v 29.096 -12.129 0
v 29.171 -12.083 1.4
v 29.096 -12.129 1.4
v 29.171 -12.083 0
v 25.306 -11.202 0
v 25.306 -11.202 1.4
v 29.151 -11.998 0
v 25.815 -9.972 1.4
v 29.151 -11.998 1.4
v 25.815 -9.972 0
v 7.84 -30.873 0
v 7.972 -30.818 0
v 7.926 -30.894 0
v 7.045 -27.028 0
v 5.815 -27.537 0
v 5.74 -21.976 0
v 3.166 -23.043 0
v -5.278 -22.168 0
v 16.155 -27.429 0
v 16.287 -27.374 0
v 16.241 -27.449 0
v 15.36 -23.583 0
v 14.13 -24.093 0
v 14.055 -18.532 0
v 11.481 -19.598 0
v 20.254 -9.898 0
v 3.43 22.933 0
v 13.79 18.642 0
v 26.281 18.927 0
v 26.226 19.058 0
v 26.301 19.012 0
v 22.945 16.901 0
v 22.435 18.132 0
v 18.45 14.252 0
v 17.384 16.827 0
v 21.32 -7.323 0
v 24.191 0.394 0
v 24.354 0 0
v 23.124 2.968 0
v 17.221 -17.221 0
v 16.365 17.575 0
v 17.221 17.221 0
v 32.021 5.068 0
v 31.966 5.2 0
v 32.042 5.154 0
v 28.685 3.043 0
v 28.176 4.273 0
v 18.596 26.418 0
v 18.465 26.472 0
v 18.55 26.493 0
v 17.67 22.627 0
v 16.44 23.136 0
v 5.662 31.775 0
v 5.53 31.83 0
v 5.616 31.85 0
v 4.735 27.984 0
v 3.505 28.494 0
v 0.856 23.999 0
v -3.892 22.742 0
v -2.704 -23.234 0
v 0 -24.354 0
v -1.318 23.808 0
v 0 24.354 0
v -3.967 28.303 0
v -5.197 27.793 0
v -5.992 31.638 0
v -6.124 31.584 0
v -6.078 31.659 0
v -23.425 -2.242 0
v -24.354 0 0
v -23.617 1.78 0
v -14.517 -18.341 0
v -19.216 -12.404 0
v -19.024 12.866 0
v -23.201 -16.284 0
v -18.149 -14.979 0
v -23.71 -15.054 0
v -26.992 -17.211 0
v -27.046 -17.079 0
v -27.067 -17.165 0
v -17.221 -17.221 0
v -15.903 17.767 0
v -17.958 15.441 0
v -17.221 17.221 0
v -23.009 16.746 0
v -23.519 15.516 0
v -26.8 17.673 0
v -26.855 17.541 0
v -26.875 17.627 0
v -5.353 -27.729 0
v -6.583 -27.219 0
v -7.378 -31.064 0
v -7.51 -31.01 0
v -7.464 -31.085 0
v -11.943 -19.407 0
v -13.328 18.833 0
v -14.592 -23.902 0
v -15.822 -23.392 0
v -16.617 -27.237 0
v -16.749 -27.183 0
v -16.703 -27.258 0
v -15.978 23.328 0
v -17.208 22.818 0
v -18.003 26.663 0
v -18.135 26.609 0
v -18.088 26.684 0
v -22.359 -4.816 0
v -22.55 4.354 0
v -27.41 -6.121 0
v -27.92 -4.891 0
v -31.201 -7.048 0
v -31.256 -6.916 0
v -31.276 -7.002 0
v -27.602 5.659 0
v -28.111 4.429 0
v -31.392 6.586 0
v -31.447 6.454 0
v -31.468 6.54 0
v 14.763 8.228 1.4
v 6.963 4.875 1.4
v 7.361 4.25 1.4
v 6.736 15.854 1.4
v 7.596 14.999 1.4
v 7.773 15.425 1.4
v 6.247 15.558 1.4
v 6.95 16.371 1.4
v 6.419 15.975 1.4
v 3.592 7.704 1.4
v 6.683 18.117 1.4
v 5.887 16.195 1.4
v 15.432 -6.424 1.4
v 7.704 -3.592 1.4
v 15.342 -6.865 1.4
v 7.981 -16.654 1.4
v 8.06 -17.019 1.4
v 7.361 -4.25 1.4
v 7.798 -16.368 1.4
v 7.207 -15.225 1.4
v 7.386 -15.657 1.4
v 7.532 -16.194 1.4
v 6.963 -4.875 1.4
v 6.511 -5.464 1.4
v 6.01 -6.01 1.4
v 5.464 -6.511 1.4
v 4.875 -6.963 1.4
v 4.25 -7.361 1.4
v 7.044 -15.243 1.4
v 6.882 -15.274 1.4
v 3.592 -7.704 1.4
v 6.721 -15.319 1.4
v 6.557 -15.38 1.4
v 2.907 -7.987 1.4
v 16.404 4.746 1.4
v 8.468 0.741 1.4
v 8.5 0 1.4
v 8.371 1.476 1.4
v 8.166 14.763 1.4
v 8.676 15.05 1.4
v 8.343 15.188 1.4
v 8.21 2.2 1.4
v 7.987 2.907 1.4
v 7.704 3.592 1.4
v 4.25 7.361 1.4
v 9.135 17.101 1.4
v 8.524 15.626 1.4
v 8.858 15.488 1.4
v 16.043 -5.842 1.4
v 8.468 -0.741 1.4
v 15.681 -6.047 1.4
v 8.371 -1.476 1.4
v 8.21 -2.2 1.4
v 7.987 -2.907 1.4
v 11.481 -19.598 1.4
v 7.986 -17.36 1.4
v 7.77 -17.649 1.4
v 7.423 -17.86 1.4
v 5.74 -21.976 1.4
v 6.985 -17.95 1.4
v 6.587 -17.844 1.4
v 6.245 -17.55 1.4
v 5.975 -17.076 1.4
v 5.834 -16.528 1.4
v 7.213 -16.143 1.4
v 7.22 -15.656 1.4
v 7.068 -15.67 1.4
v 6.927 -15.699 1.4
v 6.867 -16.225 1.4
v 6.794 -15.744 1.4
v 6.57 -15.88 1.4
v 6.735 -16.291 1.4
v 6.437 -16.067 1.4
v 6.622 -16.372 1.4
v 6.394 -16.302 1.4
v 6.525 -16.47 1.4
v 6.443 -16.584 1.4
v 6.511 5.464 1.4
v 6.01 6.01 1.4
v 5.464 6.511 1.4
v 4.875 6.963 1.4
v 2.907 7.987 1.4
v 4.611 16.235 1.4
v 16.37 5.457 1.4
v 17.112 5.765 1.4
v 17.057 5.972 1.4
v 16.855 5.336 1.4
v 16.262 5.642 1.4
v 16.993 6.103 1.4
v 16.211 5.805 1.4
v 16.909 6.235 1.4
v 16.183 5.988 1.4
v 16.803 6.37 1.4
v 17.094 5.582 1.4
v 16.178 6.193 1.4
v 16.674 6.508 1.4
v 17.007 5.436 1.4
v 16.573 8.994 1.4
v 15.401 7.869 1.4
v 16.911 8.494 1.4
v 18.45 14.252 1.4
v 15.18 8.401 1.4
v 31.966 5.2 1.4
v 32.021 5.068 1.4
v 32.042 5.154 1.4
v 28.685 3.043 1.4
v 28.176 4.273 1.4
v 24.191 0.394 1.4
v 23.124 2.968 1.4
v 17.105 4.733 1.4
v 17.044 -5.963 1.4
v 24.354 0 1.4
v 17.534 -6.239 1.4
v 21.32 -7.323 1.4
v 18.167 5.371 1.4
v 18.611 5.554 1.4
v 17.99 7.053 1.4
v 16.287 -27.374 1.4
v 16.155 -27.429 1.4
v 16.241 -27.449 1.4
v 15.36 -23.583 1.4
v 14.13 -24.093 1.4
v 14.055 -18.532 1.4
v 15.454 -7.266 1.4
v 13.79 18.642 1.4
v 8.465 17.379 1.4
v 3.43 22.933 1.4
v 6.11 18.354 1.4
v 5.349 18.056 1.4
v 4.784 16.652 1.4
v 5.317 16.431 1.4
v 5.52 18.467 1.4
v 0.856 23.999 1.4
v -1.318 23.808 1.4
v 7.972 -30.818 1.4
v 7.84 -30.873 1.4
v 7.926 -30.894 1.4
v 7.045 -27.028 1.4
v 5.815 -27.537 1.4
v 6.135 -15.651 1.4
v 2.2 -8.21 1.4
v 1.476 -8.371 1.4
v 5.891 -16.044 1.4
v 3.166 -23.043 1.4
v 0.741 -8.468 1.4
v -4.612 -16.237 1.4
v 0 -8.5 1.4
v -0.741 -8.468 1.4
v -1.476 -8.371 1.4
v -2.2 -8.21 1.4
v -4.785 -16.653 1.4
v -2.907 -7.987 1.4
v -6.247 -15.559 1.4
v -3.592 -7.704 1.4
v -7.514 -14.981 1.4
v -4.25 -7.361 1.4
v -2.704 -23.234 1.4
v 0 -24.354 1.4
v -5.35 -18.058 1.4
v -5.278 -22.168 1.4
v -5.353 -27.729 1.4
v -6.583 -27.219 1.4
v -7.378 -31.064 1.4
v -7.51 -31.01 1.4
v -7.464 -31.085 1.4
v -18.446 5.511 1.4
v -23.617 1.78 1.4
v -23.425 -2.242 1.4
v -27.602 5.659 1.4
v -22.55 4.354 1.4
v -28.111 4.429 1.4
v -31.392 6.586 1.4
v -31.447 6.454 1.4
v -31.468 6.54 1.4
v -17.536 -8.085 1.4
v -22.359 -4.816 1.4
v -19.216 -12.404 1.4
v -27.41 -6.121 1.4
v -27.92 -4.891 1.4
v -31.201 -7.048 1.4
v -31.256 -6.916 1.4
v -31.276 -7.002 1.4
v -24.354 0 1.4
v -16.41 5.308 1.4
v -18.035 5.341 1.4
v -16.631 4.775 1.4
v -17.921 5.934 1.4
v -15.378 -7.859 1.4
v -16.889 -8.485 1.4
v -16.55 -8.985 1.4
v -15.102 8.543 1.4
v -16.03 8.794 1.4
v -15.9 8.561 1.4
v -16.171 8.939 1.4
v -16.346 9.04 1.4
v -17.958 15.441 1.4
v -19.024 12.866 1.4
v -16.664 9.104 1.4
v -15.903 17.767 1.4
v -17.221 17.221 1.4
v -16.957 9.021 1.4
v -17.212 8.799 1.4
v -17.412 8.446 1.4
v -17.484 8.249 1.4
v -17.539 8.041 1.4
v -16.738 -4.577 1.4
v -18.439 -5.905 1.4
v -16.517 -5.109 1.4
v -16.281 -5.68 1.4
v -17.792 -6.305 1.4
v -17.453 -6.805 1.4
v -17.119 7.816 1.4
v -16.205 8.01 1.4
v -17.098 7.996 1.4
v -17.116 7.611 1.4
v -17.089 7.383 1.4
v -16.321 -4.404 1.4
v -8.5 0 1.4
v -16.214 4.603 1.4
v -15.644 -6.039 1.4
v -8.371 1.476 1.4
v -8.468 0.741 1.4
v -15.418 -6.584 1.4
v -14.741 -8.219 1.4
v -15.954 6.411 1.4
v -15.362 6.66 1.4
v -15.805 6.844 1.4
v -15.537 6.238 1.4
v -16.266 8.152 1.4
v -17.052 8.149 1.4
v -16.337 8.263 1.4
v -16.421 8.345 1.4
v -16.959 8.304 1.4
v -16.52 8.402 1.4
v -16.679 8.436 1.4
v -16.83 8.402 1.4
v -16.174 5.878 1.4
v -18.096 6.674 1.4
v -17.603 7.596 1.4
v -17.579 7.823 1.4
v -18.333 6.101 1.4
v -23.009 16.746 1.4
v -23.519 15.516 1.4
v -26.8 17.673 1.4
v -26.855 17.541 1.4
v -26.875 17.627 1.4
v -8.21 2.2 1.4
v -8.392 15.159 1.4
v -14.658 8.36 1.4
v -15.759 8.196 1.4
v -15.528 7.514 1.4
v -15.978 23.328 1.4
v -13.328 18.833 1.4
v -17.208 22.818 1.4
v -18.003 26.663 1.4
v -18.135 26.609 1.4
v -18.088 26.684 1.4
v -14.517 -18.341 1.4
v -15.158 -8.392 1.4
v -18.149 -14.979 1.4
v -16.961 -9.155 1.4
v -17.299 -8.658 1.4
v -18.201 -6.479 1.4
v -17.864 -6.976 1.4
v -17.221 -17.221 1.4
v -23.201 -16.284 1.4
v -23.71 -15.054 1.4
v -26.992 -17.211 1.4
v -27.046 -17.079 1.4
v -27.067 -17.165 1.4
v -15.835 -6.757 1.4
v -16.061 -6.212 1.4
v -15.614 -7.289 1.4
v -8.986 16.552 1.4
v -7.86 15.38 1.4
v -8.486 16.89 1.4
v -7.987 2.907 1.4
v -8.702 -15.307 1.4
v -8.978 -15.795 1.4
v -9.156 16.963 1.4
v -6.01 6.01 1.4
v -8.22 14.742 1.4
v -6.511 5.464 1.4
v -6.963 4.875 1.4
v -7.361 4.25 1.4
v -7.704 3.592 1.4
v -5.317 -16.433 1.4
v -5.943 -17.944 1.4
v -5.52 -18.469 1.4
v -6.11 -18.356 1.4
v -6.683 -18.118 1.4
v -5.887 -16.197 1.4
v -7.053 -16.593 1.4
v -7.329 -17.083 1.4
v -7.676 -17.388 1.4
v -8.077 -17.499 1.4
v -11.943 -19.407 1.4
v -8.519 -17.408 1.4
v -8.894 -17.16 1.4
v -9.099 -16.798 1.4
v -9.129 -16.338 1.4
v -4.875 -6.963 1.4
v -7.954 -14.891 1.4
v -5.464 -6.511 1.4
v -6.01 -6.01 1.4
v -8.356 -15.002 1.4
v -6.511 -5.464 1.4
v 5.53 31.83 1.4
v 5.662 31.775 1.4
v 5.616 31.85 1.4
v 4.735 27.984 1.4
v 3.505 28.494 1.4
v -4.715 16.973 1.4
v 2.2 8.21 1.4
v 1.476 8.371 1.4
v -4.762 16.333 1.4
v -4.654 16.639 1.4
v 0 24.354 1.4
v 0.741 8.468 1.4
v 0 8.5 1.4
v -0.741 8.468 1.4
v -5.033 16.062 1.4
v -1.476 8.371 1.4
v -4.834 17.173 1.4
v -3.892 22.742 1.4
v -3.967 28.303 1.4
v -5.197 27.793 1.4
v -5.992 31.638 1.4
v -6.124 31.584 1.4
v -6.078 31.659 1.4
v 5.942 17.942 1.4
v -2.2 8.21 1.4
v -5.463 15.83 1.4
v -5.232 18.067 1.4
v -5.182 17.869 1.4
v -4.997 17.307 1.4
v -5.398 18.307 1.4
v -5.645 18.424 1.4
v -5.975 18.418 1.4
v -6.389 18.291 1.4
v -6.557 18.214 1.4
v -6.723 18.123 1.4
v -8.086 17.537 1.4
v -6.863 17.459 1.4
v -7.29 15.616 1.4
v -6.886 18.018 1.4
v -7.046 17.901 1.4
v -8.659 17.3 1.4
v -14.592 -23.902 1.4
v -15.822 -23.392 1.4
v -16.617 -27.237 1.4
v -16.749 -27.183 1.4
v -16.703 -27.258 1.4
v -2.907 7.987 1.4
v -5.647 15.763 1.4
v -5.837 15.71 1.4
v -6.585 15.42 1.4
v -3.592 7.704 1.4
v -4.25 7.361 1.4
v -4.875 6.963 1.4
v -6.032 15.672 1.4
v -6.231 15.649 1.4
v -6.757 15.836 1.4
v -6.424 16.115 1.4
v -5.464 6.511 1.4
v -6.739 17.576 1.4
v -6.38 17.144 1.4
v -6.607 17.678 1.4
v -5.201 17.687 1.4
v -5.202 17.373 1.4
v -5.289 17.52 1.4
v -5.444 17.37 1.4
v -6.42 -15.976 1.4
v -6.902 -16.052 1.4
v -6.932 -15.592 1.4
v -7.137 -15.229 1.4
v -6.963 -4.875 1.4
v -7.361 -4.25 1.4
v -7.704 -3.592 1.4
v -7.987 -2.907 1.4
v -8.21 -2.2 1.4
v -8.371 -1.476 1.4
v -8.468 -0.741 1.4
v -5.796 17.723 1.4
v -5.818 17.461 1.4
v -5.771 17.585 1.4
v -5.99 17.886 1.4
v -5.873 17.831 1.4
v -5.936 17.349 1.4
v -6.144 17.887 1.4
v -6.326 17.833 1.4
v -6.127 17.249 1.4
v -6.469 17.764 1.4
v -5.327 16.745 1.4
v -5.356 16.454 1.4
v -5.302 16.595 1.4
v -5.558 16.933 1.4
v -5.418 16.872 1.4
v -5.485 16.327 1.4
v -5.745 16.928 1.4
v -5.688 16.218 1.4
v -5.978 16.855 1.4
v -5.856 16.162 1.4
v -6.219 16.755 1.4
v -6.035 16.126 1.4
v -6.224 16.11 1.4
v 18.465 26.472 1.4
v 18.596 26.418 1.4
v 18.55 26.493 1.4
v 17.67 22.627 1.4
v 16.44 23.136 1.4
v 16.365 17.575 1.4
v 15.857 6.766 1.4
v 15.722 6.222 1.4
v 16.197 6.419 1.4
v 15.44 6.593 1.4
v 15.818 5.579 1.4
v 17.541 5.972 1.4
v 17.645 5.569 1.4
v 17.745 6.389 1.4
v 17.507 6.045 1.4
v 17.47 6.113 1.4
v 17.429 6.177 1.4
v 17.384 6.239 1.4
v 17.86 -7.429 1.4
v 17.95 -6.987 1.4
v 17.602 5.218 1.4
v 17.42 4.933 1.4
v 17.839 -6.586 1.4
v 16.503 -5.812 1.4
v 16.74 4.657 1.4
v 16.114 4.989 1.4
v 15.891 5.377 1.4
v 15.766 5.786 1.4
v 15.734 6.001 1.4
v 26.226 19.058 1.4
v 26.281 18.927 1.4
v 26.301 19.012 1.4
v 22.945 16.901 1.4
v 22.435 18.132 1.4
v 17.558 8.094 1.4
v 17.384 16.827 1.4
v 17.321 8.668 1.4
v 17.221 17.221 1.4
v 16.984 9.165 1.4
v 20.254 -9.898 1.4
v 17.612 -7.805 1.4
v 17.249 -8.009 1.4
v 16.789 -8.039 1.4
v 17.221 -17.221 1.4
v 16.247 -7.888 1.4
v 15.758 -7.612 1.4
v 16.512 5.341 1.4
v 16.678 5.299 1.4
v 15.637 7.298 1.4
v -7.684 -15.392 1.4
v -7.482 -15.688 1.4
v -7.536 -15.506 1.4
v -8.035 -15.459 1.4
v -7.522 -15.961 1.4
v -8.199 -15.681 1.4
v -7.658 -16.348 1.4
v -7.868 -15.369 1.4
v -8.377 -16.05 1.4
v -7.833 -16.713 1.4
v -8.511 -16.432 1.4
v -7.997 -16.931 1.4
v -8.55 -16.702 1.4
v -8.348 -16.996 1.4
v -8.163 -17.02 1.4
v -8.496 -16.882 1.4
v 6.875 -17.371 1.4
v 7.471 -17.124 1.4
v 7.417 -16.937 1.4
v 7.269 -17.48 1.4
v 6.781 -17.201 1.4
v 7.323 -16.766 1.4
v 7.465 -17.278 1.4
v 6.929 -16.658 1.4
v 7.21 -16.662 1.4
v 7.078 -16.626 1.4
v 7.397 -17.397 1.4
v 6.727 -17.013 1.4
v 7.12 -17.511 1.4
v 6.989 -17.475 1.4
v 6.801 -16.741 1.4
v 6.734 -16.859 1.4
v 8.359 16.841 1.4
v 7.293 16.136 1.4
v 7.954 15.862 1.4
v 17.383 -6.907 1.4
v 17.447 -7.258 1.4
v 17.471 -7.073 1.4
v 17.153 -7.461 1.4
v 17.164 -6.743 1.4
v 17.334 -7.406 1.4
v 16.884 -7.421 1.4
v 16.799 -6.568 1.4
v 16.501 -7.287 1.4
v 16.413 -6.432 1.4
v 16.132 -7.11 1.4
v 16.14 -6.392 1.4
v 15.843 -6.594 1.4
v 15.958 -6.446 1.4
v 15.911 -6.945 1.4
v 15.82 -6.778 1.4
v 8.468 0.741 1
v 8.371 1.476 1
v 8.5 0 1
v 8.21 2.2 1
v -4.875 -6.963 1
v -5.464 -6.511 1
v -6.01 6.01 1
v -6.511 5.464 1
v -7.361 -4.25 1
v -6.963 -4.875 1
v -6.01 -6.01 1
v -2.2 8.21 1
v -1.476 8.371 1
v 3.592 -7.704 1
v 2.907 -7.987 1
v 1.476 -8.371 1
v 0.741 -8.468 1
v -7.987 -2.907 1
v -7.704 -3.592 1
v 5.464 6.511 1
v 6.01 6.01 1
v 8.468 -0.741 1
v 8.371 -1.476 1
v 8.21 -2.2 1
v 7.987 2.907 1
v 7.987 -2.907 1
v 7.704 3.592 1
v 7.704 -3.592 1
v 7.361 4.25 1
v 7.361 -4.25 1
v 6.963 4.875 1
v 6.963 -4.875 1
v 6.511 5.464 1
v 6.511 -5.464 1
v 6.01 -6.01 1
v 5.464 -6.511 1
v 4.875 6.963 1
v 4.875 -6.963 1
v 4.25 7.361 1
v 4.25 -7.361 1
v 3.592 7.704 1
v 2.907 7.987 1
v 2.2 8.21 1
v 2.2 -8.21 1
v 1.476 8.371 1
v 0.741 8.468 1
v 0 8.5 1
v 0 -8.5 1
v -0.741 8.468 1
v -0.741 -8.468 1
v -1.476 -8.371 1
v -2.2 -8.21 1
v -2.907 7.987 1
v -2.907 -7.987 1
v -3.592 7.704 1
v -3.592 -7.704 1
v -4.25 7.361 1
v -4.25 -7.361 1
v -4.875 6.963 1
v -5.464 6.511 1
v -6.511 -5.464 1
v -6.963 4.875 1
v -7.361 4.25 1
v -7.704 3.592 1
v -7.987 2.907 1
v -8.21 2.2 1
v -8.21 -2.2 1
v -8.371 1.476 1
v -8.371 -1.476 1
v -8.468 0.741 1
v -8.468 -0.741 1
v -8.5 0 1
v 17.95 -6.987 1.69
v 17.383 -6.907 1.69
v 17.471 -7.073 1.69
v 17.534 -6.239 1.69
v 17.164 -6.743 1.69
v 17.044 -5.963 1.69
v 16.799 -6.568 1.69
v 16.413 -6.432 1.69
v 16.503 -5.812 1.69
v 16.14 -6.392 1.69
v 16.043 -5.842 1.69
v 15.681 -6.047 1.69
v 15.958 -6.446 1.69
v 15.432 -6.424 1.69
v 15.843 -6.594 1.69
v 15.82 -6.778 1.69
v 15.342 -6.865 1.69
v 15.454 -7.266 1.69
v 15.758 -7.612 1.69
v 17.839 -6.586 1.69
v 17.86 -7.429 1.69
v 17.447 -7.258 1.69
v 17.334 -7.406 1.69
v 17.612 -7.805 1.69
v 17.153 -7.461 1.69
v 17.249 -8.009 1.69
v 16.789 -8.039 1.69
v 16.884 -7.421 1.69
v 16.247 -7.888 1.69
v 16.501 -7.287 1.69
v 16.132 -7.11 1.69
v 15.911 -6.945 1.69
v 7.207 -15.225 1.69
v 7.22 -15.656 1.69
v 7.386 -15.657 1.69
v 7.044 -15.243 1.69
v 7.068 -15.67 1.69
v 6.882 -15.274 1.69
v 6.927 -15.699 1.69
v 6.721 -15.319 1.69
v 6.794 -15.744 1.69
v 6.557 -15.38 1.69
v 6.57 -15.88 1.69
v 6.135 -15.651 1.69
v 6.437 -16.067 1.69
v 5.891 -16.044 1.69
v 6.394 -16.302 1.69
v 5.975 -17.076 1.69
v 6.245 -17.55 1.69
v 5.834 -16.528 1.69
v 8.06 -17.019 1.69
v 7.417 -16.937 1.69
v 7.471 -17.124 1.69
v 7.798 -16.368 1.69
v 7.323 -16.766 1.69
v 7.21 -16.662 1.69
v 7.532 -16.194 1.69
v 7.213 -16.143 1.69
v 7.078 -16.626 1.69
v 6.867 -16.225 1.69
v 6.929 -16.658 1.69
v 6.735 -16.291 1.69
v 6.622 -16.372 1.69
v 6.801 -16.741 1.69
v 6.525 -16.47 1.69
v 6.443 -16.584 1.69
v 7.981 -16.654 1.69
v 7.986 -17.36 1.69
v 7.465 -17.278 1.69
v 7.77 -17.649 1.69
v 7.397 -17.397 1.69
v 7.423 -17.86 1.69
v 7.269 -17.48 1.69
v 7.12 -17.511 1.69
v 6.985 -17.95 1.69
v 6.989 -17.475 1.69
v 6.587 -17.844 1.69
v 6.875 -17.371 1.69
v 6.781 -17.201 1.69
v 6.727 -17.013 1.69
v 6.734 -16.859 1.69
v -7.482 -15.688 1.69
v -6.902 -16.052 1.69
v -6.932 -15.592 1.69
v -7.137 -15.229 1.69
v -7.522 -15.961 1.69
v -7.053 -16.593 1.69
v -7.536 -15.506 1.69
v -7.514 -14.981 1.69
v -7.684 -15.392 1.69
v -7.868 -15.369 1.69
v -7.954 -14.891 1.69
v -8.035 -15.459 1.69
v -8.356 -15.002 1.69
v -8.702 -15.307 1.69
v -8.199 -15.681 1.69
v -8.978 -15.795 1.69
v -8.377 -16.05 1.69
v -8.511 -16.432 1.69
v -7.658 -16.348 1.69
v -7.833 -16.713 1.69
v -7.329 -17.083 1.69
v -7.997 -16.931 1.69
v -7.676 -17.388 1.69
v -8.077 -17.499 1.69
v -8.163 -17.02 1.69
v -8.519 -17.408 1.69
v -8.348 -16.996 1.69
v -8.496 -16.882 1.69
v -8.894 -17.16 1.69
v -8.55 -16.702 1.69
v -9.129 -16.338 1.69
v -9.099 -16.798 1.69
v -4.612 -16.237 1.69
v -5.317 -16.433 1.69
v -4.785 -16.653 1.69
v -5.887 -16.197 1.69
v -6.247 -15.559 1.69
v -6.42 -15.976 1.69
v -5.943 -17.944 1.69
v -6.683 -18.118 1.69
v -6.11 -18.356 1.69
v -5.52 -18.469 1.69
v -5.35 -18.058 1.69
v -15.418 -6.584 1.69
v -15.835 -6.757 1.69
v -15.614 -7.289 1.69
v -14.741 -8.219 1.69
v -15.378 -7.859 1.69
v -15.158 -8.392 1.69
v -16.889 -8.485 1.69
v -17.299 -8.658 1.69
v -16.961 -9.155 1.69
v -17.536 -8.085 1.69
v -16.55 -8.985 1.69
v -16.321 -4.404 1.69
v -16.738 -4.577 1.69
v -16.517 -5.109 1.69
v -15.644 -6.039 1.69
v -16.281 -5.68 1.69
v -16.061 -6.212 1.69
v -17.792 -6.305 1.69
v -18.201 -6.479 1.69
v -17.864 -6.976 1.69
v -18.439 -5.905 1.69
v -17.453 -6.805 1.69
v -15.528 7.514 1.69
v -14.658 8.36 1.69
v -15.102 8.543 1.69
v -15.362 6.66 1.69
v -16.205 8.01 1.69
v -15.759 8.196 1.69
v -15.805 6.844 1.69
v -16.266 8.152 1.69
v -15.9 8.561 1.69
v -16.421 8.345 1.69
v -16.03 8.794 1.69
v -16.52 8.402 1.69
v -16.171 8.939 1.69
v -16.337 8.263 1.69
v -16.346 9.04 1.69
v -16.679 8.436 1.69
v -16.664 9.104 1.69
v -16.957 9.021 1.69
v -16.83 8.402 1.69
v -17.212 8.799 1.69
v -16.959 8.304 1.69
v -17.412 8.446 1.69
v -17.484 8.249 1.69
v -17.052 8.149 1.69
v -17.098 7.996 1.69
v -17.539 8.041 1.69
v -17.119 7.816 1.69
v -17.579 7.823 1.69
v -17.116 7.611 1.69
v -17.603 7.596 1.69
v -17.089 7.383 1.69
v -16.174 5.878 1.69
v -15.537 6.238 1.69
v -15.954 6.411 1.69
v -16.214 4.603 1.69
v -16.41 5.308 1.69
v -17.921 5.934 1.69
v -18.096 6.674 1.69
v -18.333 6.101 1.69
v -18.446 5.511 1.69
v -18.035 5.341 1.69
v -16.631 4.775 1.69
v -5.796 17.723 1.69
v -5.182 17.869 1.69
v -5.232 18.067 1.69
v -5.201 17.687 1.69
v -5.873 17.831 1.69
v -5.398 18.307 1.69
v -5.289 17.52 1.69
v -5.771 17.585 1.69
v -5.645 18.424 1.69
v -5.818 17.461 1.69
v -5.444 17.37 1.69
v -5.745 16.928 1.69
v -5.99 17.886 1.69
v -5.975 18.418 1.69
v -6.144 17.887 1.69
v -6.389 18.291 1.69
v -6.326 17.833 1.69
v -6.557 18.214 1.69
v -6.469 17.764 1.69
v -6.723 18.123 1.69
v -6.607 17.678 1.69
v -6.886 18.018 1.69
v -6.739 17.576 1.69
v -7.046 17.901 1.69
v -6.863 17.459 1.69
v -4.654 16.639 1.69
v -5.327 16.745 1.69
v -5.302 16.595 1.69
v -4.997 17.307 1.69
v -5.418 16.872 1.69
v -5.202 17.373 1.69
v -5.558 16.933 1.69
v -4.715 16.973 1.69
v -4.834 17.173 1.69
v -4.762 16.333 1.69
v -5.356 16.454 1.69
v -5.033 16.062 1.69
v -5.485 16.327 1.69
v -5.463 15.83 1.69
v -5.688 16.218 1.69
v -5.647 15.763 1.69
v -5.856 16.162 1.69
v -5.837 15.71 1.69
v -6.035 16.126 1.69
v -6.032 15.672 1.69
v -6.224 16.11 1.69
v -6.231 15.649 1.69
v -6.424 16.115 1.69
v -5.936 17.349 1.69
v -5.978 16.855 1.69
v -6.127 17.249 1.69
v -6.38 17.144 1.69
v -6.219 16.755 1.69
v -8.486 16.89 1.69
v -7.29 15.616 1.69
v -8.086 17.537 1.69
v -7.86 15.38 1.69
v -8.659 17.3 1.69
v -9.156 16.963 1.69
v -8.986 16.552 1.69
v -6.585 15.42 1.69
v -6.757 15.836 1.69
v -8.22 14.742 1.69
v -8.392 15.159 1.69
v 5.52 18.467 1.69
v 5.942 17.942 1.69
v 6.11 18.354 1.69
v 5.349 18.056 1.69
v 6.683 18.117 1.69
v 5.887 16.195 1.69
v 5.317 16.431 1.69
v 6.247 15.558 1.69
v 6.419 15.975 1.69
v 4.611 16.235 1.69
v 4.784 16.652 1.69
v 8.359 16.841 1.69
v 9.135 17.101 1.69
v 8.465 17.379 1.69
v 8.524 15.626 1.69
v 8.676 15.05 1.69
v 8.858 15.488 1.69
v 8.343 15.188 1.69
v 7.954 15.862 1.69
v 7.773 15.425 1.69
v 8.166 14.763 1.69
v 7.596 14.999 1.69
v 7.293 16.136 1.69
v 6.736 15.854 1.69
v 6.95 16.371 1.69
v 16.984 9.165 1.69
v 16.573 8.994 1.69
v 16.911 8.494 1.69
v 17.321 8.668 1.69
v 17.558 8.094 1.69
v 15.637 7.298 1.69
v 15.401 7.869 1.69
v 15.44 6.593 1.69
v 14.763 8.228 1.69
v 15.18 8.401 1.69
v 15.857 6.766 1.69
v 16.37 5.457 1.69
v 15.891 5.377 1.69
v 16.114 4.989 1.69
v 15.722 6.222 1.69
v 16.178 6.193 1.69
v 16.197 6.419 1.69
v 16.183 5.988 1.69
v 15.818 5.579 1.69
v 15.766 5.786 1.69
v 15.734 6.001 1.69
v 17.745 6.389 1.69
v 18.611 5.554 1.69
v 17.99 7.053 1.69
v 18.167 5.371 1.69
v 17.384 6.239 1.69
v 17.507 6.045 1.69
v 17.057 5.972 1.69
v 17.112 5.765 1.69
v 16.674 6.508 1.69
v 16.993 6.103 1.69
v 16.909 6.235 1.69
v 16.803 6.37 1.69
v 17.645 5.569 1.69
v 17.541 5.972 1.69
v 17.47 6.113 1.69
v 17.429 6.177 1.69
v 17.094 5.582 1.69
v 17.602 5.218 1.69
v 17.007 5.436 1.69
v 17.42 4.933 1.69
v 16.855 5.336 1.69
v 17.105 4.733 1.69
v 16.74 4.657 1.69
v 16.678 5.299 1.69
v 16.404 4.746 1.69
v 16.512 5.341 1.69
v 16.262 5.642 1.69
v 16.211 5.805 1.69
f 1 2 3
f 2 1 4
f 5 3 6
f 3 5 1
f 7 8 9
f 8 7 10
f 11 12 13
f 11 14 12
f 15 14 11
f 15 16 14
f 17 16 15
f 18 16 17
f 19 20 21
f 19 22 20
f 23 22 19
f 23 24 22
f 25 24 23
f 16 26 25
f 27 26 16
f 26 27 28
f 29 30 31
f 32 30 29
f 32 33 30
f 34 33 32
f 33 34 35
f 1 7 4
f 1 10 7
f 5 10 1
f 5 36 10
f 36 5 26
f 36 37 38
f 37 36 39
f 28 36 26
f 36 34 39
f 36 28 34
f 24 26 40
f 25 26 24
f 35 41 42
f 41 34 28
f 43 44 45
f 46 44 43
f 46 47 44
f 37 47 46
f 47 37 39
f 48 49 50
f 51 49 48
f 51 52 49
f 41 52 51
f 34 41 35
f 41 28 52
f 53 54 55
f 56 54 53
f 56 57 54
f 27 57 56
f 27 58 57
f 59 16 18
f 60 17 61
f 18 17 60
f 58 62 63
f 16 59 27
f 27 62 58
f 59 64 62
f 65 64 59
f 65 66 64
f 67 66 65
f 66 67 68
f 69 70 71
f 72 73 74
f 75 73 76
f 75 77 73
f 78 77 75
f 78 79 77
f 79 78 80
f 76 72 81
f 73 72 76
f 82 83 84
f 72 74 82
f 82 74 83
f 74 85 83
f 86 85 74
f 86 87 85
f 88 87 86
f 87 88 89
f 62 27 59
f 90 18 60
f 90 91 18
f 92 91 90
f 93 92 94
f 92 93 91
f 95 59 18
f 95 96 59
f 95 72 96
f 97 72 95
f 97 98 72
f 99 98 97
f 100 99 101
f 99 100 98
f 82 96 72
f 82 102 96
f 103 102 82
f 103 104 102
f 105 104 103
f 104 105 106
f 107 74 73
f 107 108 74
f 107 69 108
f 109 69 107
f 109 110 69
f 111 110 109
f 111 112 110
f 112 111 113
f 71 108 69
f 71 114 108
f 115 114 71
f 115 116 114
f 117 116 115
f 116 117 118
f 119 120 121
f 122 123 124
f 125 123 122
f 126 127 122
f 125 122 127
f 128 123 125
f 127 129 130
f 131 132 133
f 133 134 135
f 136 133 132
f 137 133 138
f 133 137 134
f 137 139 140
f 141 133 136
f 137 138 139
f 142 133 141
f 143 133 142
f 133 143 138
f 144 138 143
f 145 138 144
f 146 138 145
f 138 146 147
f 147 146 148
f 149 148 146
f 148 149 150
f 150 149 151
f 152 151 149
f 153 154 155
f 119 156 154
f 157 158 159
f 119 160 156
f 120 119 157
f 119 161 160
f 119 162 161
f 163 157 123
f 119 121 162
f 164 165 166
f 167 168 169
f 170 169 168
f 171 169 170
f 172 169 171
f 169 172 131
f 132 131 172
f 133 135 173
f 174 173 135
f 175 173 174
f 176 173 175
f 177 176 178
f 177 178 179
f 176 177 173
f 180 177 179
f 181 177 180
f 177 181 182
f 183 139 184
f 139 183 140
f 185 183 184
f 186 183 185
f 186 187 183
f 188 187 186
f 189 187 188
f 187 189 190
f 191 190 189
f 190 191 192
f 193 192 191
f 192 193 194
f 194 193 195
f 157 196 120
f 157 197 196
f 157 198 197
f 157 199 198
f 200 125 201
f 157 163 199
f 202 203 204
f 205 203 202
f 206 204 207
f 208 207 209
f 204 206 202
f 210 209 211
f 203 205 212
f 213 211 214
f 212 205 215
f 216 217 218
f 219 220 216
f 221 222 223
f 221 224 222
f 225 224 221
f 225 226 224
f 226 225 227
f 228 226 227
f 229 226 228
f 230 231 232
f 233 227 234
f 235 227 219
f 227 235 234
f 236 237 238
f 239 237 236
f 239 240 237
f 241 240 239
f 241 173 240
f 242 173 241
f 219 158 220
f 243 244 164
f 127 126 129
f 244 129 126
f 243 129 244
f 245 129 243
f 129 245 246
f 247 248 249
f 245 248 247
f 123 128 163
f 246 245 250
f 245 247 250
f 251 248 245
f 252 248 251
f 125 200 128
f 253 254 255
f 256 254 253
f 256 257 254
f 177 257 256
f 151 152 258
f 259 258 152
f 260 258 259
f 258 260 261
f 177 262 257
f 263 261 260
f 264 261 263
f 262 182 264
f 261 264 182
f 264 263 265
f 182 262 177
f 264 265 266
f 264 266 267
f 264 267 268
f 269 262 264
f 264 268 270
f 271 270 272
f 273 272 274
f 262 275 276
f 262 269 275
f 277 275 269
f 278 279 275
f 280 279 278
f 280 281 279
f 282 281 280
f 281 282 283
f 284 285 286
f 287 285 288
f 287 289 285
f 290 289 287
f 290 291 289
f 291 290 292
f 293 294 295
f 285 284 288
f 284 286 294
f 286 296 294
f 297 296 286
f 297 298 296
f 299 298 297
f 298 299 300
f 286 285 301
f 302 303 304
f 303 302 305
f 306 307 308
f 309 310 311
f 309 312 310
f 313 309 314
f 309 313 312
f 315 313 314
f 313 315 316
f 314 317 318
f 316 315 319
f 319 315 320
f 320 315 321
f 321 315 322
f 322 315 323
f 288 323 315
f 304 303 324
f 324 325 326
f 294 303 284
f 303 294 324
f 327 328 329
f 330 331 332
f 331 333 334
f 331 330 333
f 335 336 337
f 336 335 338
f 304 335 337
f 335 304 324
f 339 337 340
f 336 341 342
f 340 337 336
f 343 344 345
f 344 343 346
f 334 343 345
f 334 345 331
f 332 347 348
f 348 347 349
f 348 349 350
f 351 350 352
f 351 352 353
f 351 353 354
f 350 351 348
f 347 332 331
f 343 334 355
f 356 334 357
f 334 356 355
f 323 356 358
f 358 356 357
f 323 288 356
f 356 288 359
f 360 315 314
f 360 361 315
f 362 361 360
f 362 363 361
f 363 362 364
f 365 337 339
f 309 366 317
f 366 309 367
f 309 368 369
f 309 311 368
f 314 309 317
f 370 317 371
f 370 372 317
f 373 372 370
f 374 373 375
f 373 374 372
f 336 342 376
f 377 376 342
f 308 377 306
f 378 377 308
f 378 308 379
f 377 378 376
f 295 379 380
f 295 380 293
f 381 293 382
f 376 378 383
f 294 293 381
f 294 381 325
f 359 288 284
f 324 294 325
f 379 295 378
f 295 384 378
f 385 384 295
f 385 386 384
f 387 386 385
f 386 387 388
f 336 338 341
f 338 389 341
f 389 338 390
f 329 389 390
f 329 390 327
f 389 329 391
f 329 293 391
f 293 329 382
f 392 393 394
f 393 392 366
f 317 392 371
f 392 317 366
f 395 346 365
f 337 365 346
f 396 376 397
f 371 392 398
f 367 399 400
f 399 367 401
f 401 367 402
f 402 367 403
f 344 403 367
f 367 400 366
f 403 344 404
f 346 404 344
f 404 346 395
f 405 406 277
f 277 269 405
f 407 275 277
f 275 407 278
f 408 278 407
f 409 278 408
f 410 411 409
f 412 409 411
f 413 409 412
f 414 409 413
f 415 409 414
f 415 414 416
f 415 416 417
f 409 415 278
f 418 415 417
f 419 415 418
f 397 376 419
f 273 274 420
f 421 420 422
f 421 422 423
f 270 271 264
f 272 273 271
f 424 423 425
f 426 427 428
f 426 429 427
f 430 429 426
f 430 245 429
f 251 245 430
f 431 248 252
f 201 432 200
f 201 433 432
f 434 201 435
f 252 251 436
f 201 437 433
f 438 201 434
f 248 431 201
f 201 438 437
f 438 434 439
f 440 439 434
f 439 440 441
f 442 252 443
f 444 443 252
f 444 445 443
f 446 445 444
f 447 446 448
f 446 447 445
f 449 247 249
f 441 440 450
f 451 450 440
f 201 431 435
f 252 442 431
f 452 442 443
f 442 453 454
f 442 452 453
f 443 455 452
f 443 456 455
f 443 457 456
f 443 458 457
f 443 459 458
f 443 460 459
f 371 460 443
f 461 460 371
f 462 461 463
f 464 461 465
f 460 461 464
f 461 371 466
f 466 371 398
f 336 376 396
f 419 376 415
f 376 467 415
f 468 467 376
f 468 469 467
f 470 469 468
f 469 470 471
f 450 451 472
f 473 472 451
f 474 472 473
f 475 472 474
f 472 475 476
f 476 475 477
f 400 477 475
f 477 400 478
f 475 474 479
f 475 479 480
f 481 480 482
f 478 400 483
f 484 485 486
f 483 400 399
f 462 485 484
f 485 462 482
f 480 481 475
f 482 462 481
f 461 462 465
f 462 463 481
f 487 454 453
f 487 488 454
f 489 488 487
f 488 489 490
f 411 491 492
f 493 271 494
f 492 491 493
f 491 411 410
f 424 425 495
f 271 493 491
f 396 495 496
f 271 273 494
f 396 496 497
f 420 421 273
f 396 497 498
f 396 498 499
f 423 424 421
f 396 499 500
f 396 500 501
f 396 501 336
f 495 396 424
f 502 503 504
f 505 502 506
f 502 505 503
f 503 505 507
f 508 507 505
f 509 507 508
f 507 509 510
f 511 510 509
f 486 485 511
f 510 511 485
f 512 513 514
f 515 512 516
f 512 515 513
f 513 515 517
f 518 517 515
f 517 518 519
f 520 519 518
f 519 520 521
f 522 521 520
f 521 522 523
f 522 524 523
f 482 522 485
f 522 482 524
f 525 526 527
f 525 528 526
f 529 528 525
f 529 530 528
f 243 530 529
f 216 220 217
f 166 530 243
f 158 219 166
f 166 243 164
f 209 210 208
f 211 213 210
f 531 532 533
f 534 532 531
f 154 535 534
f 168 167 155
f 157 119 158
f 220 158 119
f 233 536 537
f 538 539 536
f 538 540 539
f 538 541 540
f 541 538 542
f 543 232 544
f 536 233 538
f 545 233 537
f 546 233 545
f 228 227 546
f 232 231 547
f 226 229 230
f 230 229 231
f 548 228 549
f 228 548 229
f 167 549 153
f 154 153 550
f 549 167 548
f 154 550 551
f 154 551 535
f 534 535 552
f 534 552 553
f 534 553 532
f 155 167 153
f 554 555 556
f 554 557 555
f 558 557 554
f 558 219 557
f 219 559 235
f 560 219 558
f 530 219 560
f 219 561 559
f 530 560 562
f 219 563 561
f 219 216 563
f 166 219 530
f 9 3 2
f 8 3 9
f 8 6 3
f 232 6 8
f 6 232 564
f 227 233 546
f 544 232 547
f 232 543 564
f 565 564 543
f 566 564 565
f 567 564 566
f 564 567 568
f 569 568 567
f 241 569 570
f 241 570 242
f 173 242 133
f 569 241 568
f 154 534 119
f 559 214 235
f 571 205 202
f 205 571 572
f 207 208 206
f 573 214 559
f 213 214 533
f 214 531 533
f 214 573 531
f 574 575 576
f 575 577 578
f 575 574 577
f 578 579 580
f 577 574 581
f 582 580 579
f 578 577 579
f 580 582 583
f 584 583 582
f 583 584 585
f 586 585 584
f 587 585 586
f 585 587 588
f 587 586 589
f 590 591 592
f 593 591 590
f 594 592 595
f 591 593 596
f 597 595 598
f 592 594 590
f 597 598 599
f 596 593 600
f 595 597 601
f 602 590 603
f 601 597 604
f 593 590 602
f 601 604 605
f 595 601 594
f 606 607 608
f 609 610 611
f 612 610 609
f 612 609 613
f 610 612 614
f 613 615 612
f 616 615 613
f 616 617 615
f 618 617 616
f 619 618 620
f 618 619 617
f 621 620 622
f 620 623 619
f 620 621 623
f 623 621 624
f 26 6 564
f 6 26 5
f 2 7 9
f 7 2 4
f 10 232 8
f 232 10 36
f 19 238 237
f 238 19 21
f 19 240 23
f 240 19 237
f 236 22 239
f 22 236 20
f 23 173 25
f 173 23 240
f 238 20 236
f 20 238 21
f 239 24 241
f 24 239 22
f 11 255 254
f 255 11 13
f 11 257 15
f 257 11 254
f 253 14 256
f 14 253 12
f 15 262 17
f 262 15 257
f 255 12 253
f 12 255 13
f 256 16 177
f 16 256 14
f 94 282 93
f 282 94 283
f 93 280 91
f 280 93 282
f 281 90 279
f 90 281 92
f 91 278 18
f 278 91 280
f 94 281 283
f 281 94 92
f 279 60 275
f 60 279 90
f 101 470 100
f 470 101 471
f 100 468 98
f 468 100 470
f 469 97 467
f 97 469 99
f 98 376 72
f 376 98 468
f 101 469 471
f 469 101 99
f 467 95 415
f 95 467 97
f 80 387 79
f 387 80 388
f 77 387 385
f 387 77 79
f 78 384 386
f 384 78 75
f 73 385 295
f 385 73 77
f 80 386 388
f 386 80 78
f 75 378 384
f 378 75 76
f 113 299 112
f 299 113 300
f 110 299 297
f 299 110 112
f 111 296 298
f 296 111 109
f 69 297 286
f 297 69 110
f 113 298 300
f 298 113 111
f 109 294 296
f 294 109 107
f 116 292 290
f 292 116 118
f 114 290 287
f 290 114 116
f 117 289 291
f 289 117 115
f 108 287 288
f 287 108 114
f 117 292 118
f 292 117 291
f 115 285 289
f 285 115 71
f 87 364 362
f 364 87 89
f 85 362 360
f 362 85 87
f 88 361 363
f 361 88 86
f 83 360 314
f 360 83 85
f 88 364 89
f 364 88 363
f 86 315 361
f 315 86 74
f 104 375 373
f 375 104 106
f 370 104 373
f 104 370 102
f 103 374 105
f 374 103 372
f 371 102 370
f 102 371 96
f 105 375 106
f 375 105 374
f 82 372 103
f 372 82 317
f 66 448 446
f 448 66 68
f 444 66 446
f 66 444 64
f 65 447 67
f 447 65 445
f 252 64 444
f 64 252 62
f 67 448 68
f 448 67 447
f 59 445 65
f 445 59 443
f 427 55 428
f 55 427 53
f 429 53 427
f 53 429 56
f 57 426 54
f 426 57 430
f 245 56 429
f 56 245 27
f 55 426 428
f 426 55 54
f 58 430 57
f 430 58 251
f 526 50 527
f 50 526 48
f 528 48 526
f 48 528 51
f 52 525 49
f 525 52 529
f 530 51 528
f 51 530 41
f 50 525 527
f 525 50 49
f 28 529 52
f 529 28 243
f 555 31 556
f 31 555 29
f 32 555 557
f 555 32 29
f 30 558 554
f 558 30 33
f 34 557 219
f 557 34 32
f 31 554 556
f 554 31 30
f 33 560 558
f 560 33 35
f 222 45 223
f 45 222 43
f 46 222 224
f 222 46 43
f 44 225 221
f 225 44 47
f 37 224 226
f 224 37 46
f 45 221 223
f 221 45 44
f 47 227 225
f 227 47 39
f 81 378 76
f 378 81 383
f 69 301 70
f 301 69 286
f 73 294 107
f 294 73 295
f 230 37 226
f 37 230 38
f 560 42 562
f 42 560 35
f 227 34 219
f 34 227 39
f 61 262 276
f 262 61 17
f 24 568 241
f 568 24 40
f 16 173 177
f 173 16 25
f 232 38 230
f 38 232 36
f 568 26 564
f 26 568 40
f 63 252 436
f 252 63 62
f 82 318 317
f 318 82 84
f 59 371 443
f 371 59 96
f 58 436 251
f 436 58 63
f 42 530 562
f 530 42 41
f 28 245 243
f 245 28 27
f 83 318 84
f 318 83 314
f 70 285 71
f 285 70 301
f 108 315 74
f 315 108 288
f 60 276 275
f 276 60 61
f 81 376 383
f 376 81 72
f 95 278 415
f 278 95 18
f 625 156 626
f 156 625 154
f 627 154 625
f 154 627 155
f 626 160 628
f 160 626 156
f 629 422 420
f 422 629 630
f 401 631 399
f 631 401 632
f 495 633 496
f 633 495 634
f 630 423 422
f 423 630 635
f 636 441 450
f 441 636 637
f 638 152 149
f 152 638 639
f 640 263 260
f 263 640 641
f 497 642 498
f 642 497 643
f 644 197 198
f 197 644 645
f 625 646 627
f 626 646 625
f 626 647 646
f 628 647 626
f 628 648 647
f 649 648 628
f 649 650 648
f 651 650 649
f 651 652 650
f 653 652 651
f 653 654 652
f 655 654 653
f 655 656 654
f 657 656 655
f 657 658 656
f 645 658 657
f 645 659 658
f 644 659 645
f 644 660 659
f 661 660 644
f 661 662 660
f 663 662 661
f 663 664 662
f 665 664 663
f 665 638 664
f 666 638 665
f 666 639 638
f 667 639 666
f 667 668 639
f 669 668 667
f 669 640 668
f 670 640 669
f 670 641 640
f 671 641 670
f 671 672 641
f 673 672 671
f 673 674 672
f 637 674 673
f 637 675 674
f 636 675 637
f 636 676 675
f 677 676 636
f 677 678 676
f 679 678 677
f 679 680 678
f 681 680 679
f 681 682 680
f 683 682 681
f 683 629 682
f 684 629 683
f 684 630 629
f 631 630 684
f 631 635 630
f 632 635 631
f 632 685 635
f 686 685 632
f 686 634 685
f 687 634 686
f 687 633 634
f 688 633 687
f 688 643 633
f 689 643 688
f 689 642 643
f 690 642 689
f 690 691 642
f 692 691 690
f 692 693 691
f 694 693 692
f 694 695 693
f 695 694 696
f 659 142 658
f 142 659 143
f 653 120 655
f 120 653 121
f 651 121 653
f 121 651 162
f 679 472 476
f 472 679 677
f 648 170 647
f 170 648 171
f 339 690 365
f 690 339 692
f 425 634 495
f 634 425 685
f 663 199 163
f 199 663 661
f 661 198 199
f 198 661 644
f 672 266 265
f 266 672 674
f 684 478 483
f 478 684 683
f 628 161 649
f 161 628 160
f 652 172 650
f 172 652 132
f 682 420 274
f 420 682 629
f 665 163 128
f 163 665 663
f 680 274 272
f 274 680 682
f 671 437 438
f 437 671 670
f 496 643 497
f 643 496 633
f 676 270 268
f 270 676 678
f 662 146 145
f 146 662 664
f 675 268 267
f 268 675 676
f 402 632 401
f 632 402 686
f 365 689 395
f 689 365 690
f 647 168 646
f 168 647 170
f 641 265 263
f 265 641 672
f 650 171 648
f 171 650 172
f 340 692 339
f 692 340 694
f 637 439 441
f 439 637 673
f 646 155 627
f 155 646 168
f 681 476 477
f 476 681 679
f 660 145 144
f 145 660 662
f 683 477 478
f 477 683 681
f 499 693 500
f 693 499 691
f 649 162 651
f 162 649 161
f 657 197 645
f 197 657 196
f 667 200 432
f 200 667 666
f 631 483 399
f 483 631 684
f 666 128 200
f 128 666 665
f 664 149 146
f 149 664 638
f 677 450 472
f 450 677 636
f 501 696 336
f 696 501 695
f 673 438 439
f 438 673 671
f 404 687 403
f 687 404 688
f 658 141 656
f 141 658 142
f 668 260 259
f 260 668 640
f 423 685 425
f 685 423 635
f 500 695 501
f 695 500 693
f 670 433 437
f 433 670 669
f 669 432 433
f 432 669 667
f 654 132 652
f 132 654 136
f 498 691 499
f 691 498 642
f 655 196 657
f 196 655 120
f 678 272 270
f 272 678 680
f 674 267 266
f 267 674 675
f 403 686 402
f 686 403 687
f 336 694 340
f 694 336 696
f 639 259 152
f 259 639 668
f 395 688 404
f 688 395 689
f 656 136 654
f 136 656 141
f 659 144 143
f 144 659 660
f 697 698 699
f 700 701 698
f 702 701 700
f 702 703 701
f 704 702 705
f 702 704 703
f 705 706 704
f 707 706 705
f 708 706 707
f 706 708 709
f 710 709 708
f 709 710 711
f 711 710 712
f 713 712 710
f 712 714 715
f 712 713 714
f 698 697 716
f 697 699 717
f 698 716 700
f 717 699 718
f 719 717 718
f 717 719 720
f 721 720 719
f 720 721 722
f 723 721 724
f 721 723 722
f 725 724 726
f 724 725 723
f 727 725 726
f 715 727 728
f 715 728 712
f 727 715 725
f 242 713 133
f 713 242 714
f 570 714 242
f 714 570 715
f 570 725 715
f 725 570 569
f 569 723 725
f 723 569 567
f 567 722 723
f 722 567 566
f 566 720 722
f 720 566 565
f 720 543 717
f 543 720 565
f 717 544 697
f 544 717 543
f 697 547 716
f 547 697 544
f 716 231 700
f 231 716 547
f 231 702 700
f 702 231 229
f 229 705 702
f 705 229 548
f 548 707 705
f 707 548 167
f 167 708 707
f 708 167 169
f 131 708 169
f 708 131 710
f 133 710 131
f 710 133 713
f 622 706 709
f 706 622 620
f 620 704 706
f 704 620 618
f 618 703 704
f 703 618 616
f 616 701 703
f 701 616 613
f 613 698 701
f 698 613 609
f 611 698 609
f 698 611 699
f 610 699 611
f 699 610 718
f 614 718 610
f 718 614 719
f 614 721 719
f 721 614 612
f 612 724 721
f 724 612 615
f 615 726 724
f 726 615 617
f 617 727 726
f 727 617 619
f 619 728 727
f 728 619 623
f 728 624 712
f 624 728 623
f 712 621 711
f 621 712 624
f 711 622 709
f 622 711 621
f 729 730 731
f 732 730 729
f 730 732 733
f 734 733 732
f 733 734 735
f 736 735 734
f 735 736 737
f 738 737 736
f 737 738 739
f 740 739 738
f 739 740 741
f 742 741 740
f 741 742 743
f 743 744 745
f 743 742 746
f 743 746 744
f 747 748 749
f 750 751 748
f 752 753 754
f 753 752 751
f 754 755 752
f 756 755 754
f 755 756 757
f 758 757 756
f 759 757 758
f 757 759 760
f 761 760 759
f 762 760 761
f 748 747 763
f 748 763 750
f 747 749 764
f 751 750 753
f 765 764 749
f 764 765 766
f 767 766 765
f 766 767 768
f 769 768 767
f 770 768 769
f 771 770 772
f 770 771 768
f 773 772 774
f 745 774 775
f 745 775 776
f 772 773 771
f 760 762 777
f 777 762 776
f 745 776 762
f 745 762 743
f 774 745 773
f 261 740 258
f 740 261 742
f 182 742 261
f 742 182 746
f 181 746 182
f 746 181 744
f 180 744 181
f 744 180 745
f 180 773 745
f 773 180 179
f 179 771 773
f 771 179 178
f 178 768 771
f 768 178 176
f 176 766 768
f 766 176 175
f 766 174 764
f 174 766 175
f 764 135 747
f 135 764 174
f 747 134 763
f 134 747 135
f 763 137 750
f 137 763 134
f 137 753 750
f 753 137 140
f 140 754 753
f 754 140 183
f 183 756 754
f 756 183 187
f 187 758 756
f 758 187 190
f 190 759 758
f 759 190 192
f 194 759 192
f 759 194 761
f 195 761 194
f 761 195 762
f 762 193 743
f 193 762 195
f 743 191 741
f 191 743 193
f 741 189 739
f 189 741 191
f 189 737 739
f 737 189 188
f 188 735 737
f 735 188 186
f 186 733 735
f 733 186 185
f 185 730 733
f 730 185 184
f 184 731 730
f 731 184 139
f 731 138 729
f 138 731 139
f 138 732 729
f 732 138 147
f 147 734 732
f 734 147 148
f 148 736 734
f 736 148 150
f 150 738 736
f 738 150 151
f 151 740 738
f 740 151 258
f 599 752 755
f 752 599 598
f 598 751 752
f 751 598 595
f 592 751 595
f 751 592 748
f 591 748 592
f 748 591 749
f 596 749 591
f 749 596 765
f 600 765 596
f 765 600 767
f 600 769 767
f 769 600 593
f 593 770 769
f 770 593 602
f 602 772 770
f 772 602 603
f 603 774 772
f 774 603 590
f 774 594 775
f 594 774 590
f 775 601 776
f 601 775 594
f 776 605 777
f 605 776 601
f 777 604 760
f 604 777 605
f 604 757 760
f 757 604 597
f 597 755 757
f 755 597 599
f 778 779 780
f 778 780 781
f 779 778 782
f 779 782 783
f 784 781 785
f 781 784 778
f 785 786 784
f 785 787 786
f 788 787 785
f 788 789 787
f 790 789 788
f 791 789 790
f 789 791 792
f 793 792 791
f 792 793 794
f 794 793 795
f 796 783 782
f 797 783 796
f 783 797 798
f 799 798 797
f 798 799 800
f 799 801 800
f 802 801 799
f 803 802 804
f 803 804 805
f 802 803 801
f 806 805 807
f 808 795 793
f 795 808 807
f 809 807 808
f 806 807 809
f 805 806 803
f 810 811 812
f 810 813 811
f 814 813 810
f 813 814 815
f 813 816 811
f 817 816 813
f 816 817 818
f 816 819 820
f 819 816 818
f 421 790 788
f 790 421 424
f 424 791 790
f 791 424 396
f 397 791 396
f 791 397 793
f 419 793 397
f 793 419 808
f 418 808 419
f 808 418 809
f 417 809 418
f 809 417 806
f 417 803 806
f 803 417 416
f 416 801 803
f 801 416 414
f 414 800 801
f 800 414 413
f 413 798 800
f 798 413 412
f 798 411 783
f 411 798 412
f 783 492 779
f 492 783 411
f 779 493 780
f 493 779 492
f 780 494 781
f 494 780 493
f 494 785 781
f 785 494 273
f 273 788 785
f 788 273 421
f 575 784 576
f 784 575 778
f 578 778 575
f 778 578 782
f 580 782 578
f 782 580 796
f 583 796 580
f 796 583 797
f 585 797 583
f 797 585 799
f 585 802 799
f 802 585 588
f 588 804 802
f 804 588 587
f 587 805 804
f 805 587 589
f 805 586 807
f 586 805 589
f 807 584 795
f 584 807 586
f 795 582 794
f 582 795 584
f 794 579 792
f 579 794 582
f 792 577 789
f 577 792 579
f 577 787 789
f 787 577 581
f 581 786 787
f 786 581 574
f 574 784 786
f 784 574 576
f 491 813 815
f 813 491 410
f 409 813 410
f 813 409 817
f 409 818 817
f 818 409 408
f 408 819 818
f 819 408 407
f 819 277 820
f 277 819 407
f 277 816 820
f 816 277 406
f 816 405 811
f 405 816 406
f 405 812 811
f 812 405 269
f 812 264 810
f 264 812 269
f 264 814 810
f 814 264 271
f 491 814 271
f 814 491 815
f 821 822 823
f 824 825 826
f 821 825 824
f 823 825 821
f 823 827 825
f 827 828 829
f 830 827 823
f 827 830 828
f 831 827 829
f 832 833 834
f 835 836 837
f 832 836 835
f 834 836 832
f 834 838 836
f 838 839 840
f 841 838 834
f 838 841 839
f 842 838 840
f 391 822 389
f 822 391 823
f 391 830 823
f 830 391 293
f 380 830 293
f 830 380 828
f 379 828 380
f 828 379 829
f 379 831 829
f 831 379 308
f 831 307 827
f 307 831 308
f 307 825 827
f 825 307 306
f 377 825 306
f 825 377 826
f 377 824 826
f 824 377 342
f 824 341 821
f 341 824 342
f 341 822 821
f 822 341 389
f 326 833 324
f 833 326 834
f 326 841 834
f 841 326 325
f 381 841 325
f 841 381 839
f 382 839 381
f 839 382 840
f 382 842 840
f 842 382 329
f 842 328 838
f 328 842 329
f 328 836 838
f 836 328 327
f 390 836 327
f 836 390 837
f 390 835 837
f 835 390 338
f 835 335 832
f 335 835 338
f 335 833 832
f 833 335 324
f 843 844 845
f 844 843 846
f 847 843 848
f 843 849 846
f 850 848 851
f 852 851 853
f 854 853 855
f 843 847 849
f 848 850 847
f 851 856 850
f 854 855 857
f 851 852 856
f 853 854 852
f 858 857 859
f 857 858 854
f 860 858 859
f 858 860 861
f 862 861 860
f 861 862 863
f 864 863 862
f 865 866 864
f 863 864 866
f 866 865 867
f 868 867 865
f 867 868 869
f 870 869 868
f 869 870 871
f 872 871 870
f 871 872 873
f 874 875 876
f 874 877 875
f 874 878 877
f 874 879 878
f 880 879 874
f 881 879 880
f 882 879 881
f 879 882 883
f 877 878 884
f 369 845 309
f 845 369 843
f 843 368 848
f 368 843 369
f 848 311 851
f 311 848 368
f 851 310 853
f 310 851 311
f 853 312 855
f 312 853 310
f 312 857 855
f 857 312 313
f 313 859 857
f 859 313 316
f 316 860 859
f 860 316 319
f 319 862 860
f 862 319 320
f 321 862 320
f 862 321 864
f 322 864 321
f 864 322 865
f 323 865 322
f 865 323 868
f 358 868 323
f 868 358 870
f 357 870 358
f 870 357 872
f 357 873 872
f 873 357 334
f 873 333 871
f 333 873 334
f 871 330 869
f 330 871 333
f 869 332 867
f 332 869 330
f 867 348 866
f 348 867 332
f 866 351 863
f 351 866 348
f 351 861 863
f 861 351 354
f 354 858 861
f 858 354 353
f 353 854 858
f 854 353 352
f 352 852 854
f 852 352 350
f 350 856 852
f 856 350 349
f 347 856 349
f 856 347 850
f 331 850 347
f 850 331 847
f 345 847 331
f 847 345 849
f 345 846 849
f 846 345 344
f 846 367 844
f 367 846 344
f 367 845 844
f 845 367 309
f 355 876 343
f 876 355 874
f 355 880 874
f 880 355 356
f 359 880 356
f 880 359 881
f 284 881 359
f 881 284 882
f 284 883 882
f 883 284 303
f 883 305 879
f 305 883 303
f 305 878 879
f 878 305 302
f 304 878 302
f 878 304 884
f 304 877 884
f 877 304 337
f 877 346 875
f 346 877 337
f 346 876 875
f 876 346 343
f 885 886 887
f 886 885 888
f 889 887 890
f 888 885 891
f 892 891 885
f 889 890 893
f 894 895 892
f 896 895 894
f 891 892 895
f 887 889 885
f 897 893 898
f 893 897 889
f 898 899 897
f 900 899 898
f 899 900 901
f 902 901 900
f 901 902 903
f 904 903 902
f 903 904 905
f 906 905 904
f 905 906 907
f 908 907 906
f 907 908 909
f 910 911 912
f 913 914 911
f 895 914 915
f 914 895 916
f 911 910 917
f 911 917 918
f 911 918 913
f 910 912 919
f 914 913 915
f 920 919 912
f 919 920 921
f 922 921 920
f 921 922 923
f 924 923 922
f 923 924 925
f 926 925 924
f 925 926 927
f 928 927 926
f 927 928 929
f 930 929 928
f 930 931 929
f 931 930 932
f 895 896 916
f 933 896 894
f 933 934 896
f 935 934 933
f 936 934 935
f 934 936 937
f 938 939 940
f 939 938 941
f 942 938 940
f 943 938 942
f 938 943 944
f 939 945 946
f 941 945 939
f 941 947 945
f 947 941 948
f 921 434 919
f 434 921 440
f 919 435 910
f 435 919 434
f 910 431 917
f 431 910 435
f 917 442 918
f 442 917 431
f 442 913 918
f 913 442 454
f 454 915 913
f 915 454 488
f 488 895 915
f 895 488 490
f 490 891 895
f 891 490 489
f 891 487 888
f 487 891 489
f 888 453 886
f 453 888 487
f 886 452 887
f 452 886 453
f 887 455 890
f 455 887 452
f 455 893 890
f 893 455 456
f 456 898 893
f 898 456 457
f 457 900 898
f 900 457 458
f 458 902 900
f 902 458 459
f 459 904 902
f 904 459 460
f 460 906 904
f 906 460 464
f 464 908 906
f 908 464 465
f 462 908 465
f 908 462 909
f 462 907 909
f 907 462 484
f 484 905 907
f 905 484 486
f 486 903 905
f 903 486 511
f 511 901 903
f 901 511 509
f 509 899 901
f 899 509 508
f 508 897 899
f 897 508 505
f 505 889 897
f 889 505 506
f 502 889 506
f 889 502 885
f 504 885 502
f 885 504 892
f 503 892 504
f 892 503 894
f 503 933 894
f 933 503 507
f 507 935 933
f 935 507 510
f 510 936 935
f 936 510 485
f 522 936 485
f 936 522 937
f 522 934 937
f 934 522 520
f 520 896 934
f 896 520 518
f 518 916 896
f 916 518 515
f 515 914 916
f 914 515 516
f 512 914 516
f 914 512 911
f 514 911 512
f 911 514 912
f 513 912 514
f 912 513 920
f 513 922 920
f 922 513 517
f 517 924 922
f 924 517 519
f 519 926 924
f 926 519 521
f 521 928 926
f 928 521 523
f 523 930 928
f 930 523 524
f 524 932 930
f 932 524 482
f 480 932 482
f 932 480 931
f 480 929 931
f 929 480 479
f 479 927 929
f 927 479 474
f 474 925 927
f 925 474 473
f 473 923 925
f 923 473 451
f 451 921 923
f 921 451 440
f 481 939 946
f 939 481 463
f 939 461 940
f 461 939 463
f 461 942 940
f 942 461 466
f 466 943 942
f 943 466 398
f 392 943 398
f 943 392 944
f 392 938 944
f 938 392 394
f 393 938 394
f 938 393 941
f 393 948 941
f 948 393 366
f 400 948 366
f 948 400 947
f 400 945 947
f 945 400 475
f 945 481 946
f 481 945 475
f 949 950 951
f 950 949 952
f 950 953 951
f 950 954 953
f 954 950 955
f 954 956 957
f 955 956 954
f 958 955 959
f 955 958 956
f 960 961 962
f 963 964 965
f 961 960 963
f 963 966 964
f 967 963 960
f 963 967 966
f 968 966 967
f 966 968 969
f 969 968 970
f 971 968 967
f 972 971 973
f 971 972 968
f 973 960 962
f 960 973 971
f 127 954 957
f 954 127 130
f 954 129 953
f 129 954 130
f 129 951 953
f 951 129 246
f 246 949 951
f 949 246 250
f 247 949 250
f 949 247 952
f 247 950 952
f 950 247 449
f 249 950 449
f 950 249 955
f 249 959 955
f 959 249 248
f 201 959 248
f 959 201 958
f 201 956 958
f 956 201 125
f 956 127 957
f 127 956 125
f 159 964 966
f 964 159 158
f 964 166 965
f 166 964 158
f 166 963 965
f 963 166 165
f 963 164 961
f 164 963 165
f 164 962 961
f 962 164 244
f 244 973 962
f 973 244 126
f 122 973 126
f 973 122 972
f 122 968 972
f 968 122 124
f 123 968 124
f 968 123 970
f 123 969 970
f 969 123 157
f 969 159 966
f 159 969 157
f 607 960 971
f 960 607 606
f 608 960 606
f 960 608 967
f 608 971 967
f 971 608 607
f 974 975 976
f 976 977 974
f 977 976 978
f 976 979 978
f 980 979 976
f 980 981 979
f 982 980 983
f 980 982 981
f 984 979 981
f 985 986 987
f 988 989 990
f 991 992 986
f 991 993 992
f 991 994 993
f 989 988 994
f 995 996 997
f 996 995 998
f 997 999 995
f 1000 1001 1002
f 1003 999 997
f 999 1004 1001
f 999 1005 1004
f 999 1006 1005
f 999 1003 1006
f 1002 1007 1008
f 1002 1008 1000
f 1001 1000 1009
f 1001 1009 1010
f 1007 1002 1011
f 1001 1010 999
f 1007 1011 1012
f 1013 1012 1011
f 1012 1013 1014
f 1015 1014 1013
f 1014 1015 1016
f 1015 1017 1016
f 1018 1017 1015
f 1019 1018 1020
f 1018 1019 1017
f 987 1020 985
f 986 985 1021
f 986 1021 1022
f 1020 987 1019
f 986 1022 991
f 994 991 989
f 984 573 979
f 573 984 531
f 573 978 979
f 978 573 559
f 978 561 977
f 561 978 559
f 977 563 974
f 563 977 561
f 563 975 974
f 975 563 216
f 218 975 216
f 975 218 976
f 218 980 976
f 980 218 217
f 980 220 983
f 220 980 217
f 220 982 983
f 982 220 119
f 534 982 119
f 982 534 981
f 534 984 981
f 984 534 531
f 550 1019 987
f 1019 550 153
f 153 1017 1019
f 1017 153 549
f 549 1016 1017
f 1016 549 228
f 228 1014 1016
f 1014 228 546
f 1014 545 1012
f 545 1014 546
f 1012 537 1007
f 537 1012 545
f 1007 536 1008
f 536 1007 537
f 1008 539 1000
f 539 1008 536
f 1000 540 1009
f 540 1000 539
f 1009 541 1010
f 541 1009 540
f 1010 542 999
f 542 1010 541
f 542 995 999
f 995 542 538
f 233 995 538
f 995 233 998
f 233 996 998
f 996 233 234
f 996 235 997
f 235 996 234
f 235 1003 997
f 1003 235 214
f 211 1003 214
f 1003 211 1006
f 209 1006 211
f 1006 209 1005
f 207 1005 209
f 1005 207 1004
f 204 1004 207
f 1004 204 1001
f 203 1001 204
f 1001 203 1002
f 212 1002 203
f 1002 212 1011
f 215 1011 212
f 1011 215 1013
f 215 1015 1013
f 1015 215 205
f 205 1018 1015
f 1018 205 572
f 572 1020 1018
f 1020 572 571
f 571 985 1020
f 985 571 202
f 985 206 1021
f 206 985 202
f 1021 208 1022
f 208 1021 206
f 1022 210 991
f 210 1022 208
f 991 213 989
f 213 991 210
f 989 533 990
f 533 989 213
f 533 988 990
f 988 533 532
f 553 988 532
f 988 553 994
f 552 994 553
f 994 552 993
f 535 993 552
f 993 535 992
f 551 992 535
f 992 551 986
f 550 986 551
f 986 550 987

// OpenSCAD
// 2-Point Discrimination Wheel — parametric n-gon, clockwise order
distances_mm       = is_undef(distances_mm) ? [0,9,10,11,12,13,14,15] : distances_mm;
outer_flat_to_flat = is_undef(outer_flat_to_flat) ? 45 : outer_flat_to_flat;
base_thickness     = is_undef(base_thickness) ? 1.4 : base_thickness;
spike_length  = is_undef(spike_length) ? 9 : spike_length;
base_d        = is_undef(base_d) ? 3 : base_d;
shank_d       = is_undef(shank_d) ? 1.4 : shank_d;
tip_d         = is_undef(tip_d) ? 0.15 : tip_d;
root_overlap  = is_undef(root_overlap) ? .7 : root_overlap;
label_size    = is_undef(label_size) ? 2.5 : label_size;
label_depth   = is_undef(label_depth) ? .3 : label_depth;
font_name     = is_undef(font_name) ? "DejaVu Sans:style=Bold" : font_name;
label_radial  = is_undef(label_radial) ? 0.80 : label_radial;
hub_diameter  = is_undef(hub_diameter) ? 17 : hub_diameter;
thumb_depth   = is_undef(thumb_depth) ? 1.2 : thumb_depth;
chamfer = is_undef(chamfer) ? 0.8 : chamfer;
$fn = is_undef($fn) ? 72 : $fn;

module soft_chamfer(h=chamfer){
  if (h>0) minkowski(){ children(); cylinder(h=h,r1=h,r2=0,$fn=24); }
  else children();
}
function apothem(across_flats,n)=across_flats/2;
function circ_radius(across_flats,n)=across_flats/(2*cos(180/n));
function total_thickness()=base_thickness+max(chamfer,0);

module polygon_plate(n, across_flats, thk){
  r = circ_radius(across_flats,n);
  linear_extrude(thk)
    polygon(points=[for(i=[0:n-1]) let(a=360*i/n)[r*cos(a), r*sin(a)]]);
}


module spike_single_flat(len=spike_length,bd=base_d,sd=shank_d,td=tip_d){
  base_r=bd/2; shank_r=sd/2; tip_r=td/2;
  bx=-root_overlap; sx=len*0.55; tx=len;
  linear_extrude(height=base_thickness)
  union(){
    translate([bx,0]) circle(r=base_r);
    hull(){translate([bx,0])circle(r=base_r);translate([sx,0])circle(r=shank_r);}
    hull(){translate([sx,0])circle(r=shank_r);translate([tx,0])circle(r=tip_r);}
  }
}

module thumb_well_top(){
  translate([0,0,total_thickness()-thumb_depth])
    cylinder(h=thumb_depth,d=hub_diameter,$fn=72);
}

module edge_numbers_top(distances,a){
  n=len(distances);
  for(i=[0:n-1]){
    angN=-360*(i+0.5)/n;
    translate([(label_radial*a)*cos(angN),
               (label_radial*a)*sin(angN),
               base_thickness - 0.01])
      rotate([0,0,angN-90])
        linear_extrude(height=label_depth)
          text(str(distances[i]),
               size=label_size,font=font_name,
               halign="center",valign="center");
  }
}


module wheel_solid(distances){
  n=len(distances);
  a=apothem(outer_flat_to_flat,n);
  union(){
    polygon_plate(n,outer_flat_to_flat,base_thickness);
    for(i=[0:n-1]){
      angN=-360*(i+0.5)/n;
      translate([a*cos(angN),a*sin(angN),0])
        rotate([0,0,angN]){
          sep=distances[i];
          translate([0,+sep/2,0])spike_single_flat();
          translate([0,-sep/2,0])spike_single_flat();
        }
    }
  }
}

module discriminator(distances){
  n=len(distances);
  assert(n>=3,"distances_mm must have at least 3 entries.");

  union(){
    difference(){
      wheel_solid(distances);
      thumb_well_top();
    }
    edge_numbers_top(distances, apothem(outer_flat_to_flat,n));
  }
}
discriminator(distances_mm);
